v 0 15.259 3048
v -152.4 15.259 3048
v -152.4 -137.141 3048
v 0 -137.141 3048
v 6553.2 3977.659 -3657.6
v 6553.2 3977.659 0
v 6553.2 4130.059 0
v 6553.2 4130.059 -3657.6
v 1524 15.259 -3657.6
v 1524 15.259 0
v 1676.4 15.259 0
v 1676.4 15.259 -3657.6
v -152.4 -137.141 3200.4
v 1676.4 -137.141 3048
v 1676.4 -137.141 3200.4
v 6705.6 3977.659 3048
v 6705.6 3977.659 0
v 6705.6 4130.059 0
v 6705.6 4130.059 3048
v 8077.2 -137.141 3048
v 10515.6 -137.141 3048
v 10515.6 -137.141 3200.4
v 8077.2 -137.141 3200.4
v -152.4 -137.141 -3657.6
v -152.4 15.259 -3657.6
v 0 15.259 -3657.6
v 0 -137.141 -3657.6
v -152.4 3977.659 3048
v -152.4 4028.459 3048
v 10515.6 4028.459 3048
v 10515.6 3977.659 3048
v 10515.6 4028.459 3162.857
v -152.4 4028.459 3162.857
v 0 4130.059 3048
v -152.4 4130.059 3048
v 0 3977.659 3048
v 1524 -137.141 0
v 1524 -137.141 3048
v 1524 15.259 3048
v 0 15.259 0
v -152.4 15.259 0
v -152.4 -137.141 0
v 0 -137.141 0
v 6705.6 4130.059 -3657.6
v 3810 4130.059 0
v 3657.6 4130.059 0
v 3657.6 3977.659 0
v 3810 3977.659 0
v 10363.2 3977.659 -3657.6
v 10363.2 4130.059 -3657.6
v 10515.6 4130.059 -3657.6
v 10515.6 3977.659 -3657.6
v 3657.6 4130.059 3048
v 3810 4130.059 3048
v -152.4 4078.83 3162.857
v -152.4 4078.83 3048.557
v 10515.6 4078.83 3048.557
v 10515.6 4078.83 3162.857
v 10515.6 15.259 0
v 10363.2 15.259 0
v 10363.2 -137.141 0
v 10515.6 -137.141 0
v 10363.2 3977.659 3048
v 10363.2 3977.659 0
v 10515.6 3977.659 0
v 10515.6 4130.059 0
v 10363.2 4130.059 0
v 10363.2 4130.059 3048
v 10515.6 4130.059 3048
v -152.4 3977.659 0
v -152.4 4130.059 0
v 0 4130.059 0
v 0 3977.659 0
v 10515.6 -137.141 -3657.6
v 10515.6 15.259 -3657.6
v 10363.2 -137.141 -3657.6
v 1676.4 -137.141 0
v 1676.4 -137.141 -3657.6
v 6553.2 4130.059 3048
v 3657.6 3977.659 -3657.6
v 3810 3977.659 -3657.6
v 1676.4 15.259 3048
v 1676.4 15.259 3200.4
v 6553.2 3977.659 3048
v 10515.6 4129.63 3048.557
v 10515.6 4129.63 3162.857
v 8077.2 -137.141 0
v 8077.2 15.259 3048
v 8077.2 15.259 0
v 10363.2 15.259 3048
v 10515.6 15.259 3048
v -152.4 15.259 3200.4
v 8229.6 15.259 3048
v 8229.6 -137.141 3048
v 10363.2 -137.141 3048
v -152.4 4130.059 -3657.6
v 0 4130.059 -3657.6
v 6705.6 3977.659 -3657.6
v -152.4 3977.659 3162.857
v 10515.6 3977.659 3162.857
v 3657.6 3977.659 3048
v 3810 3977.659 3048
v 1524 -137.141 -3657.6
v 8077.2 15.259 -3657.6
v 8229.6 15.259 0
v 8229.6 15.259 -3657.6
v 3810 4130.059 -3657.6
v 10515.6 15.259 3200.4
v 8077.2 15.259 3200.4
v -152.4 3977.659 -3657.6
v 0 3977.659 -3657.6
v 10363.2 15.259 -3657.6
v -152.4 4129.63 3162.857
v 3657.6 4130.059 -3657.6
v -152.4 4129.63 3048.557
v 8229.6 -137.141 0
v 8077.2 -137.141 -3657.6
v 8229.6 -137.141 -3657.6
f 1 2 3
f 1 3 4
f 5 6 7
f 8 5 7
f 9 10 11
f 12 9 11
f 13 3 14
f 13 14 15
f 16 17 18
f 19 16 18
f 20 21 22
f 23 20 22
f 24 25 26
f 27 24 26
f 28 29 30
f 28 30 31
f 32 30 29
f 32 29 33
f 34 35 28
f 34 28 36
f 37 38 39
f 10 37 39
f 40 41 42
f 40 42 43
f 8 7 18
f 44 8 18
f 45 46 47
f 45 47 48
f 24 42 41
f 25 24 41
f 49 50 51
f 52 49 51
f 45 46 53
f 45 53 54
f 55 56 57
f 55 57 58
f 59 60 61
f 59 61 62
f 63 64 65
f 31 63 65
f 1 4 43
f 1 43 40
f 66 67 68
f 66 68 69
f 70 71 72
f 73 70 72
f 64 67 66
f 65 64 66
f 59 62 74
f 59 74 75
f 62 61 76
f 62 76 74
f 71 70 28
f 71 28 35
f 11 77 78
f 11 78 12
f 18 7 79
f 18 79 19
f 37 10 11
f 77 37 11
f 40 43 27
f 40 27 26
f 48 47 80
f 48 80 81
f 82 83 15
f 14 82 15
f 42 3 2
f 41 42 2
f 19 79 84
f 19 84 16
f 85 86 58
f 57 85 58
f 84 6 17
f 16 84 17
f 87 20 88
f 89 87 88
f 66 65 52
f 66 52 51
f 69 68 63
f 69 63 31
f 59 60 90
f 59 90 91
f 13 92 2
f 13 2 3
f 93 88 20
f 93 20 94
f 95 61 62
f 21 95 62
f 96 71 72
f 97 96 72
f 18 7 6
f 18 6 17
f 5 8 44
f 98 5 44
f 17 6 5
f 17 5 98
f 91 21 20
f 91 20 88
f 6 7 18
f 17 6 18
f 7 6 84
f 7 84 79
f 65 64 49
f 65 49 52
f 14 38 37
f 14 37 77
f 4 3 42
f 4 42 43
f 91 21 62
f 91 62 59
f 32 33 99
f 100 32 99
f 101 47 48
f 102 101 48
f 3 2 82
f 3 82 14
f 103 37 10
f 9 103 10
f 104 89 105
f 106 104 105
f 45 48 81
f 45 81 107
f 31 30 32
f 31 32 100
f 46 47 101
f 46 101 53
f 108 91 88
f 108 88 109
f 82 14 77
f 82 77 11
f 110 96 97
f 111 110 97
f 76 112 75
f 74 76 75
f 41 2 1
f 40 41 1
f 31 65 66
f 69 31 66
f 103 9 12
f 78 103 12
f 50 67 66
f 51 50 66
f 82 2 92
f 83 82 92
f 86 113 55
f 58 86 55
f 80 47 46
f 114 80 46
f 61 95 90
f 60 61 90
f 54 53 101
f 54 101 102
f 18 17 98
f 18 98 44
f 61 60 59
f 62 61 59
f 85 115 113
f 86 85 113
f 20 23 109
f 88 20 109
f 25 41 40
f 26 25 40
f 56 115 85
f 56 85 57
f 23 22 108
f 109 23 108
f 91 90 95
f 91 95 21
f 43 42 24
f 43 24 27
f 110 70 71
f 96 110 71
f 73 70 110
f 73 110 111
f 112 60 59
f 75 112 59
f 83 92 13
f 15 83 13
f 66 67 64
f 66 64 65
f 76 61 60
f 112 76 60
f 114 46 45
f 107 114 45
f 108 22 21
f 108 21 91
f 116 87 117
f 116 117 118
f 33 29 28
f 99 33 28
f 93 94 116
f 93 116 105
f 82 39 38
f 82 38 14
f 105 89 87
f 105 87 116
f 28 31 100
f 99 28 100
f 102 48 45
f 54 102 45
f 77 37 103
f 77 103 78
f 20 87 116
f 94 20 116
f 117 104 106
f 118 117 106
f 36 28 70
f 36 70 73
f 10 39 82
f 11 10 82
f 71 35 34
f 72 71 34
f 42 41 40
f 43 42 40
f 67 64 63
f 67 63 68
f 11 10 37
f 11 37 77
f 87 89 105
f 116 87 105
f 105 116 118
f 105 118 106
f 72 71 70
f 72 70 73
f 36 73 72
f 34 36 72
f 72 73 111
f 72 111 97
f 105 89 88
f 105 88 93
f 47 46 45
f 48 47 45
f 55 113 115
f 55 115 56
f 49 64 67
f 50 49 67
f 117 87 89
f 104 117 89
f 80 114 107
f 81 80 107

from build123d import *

# Parameters (mm, degrees)
F0_W     = 152.4
F0_H     = 152.4
F1_DEPTH = 3048
F2_DEPTH = 3657.6
F3_W     = 152.4
F3_H     = 152.4
F4_DEPTH = 1828.8
F5_W     = 152.4
F5_H     = 152.4
F6_DEPTH = 2438.4
F3_W_2   = 50.8
F3_H_2   = 114.3
F3_H_3   = 114.856805
F7_DEPTH = 10668


with BuildPart() as f1:
    # F0 (on Top) → F1 (new body)
    with BuildSketch(Plane.XY):
        with Locations((-76.2, 4053.859329)):
            Rectangle(F0_W, F0_H)
        with Locations((3733.8, 4053.859329)):
            Rectangle(F0_W, F0_H)
        with Locations((6629.4, 4053.859329)):
            Rectangle(F0_W, F0_H)
        with Locations((-76.2, -60.940671)):
            Rectangle(F0_W, F0_H)
        with Locations((1600.2, -60.940671)):
            Rectangle(F0_W, F0_H)
        with Locations((8153.4, -60.940671)):
            Rectangle(F0_W, F0_H)
        with Locations((10439.4, 4053.859329)):
            Rectangle(F0_W, F0_H)
        with Locations((10439.4, -60.940671)):
            Rectangle(F0_W, F0_H)
    extrude(amount=F1_DEPTH)


with BuildPart() as f2:
    # F0 (on Top) → F2 (new body)
    with BuildSketch(Plane.XY):
        with Locations((-76.2, 4053.859329)):
            Rectangle(F0_W, F0_H)
        with Locations((3733.8, 4053.859329)):
            Rectangle(F0_W, F0_H)
        with Locations((6629.4, 4053.859329)):
            Rectangle(F0_W, F0_H)
        with Locations((-76.2, -60.940671)):
            Rectangle(F0_W, F0_H)
        with Locations((1600.2, -60.940671)):
            Rectangle(F0_W, F0_H)
        with Locations((8153.4, -60.940671)):
            Rectangle(F0_W, F0_H)
        with Locations((10439.4, 4053.859329)):
            Rectangle(F0_W, F0_H)
        with Locations((10439.4, -60.940671)):
            Rectangle(F0_W, F0_H)
    extrude(amount=-F2_DEPTH)


with BuildPart() as f4:
    # F3 (on face) → F4 (new body, through all)
    with BuildSketch(Plane(origin=(-152.4, 0, 0), x_dir=(0, -1, 0), z_dir=(-1, 0, 0))):
        with Locations((60.940671, 3124.2)):
            Rectangle(F3_W, F3_H)
    extrude(amount=-F4_DEPTH)


with BuildPart() as f6:
    # F5 (on face) → F6 (new body, through all)
    with BuildSketch(Plane.YZ.offset(10515.6)):
        with Locations((-60.940671, 3124.2)):
            Rectangle(F5_W, F5_H)
    extrude(amount=-F6_DEPTH)


with BuildPart() as f7:
    # F3 (on face) → F7 (new body, through all)
    with BuildSketch(Plane(origin=(-152.4, 0, 0), x_dir=(0, -1, 0), z_dir=(-1, 0, 0))):
        with Locations((-4104.230089, 3105.706805)):
            Rectangle(F3_W_2, F3_H_2)
        with Locations((-4003.059329, 3105.428402)):
            Rectangle(F3_W_2, F3_H_3)
    extrude(amount=-F7_DEPTH)


solid = Compound([f1.part, f2.part, f4.part, f6.part, f7.part])
